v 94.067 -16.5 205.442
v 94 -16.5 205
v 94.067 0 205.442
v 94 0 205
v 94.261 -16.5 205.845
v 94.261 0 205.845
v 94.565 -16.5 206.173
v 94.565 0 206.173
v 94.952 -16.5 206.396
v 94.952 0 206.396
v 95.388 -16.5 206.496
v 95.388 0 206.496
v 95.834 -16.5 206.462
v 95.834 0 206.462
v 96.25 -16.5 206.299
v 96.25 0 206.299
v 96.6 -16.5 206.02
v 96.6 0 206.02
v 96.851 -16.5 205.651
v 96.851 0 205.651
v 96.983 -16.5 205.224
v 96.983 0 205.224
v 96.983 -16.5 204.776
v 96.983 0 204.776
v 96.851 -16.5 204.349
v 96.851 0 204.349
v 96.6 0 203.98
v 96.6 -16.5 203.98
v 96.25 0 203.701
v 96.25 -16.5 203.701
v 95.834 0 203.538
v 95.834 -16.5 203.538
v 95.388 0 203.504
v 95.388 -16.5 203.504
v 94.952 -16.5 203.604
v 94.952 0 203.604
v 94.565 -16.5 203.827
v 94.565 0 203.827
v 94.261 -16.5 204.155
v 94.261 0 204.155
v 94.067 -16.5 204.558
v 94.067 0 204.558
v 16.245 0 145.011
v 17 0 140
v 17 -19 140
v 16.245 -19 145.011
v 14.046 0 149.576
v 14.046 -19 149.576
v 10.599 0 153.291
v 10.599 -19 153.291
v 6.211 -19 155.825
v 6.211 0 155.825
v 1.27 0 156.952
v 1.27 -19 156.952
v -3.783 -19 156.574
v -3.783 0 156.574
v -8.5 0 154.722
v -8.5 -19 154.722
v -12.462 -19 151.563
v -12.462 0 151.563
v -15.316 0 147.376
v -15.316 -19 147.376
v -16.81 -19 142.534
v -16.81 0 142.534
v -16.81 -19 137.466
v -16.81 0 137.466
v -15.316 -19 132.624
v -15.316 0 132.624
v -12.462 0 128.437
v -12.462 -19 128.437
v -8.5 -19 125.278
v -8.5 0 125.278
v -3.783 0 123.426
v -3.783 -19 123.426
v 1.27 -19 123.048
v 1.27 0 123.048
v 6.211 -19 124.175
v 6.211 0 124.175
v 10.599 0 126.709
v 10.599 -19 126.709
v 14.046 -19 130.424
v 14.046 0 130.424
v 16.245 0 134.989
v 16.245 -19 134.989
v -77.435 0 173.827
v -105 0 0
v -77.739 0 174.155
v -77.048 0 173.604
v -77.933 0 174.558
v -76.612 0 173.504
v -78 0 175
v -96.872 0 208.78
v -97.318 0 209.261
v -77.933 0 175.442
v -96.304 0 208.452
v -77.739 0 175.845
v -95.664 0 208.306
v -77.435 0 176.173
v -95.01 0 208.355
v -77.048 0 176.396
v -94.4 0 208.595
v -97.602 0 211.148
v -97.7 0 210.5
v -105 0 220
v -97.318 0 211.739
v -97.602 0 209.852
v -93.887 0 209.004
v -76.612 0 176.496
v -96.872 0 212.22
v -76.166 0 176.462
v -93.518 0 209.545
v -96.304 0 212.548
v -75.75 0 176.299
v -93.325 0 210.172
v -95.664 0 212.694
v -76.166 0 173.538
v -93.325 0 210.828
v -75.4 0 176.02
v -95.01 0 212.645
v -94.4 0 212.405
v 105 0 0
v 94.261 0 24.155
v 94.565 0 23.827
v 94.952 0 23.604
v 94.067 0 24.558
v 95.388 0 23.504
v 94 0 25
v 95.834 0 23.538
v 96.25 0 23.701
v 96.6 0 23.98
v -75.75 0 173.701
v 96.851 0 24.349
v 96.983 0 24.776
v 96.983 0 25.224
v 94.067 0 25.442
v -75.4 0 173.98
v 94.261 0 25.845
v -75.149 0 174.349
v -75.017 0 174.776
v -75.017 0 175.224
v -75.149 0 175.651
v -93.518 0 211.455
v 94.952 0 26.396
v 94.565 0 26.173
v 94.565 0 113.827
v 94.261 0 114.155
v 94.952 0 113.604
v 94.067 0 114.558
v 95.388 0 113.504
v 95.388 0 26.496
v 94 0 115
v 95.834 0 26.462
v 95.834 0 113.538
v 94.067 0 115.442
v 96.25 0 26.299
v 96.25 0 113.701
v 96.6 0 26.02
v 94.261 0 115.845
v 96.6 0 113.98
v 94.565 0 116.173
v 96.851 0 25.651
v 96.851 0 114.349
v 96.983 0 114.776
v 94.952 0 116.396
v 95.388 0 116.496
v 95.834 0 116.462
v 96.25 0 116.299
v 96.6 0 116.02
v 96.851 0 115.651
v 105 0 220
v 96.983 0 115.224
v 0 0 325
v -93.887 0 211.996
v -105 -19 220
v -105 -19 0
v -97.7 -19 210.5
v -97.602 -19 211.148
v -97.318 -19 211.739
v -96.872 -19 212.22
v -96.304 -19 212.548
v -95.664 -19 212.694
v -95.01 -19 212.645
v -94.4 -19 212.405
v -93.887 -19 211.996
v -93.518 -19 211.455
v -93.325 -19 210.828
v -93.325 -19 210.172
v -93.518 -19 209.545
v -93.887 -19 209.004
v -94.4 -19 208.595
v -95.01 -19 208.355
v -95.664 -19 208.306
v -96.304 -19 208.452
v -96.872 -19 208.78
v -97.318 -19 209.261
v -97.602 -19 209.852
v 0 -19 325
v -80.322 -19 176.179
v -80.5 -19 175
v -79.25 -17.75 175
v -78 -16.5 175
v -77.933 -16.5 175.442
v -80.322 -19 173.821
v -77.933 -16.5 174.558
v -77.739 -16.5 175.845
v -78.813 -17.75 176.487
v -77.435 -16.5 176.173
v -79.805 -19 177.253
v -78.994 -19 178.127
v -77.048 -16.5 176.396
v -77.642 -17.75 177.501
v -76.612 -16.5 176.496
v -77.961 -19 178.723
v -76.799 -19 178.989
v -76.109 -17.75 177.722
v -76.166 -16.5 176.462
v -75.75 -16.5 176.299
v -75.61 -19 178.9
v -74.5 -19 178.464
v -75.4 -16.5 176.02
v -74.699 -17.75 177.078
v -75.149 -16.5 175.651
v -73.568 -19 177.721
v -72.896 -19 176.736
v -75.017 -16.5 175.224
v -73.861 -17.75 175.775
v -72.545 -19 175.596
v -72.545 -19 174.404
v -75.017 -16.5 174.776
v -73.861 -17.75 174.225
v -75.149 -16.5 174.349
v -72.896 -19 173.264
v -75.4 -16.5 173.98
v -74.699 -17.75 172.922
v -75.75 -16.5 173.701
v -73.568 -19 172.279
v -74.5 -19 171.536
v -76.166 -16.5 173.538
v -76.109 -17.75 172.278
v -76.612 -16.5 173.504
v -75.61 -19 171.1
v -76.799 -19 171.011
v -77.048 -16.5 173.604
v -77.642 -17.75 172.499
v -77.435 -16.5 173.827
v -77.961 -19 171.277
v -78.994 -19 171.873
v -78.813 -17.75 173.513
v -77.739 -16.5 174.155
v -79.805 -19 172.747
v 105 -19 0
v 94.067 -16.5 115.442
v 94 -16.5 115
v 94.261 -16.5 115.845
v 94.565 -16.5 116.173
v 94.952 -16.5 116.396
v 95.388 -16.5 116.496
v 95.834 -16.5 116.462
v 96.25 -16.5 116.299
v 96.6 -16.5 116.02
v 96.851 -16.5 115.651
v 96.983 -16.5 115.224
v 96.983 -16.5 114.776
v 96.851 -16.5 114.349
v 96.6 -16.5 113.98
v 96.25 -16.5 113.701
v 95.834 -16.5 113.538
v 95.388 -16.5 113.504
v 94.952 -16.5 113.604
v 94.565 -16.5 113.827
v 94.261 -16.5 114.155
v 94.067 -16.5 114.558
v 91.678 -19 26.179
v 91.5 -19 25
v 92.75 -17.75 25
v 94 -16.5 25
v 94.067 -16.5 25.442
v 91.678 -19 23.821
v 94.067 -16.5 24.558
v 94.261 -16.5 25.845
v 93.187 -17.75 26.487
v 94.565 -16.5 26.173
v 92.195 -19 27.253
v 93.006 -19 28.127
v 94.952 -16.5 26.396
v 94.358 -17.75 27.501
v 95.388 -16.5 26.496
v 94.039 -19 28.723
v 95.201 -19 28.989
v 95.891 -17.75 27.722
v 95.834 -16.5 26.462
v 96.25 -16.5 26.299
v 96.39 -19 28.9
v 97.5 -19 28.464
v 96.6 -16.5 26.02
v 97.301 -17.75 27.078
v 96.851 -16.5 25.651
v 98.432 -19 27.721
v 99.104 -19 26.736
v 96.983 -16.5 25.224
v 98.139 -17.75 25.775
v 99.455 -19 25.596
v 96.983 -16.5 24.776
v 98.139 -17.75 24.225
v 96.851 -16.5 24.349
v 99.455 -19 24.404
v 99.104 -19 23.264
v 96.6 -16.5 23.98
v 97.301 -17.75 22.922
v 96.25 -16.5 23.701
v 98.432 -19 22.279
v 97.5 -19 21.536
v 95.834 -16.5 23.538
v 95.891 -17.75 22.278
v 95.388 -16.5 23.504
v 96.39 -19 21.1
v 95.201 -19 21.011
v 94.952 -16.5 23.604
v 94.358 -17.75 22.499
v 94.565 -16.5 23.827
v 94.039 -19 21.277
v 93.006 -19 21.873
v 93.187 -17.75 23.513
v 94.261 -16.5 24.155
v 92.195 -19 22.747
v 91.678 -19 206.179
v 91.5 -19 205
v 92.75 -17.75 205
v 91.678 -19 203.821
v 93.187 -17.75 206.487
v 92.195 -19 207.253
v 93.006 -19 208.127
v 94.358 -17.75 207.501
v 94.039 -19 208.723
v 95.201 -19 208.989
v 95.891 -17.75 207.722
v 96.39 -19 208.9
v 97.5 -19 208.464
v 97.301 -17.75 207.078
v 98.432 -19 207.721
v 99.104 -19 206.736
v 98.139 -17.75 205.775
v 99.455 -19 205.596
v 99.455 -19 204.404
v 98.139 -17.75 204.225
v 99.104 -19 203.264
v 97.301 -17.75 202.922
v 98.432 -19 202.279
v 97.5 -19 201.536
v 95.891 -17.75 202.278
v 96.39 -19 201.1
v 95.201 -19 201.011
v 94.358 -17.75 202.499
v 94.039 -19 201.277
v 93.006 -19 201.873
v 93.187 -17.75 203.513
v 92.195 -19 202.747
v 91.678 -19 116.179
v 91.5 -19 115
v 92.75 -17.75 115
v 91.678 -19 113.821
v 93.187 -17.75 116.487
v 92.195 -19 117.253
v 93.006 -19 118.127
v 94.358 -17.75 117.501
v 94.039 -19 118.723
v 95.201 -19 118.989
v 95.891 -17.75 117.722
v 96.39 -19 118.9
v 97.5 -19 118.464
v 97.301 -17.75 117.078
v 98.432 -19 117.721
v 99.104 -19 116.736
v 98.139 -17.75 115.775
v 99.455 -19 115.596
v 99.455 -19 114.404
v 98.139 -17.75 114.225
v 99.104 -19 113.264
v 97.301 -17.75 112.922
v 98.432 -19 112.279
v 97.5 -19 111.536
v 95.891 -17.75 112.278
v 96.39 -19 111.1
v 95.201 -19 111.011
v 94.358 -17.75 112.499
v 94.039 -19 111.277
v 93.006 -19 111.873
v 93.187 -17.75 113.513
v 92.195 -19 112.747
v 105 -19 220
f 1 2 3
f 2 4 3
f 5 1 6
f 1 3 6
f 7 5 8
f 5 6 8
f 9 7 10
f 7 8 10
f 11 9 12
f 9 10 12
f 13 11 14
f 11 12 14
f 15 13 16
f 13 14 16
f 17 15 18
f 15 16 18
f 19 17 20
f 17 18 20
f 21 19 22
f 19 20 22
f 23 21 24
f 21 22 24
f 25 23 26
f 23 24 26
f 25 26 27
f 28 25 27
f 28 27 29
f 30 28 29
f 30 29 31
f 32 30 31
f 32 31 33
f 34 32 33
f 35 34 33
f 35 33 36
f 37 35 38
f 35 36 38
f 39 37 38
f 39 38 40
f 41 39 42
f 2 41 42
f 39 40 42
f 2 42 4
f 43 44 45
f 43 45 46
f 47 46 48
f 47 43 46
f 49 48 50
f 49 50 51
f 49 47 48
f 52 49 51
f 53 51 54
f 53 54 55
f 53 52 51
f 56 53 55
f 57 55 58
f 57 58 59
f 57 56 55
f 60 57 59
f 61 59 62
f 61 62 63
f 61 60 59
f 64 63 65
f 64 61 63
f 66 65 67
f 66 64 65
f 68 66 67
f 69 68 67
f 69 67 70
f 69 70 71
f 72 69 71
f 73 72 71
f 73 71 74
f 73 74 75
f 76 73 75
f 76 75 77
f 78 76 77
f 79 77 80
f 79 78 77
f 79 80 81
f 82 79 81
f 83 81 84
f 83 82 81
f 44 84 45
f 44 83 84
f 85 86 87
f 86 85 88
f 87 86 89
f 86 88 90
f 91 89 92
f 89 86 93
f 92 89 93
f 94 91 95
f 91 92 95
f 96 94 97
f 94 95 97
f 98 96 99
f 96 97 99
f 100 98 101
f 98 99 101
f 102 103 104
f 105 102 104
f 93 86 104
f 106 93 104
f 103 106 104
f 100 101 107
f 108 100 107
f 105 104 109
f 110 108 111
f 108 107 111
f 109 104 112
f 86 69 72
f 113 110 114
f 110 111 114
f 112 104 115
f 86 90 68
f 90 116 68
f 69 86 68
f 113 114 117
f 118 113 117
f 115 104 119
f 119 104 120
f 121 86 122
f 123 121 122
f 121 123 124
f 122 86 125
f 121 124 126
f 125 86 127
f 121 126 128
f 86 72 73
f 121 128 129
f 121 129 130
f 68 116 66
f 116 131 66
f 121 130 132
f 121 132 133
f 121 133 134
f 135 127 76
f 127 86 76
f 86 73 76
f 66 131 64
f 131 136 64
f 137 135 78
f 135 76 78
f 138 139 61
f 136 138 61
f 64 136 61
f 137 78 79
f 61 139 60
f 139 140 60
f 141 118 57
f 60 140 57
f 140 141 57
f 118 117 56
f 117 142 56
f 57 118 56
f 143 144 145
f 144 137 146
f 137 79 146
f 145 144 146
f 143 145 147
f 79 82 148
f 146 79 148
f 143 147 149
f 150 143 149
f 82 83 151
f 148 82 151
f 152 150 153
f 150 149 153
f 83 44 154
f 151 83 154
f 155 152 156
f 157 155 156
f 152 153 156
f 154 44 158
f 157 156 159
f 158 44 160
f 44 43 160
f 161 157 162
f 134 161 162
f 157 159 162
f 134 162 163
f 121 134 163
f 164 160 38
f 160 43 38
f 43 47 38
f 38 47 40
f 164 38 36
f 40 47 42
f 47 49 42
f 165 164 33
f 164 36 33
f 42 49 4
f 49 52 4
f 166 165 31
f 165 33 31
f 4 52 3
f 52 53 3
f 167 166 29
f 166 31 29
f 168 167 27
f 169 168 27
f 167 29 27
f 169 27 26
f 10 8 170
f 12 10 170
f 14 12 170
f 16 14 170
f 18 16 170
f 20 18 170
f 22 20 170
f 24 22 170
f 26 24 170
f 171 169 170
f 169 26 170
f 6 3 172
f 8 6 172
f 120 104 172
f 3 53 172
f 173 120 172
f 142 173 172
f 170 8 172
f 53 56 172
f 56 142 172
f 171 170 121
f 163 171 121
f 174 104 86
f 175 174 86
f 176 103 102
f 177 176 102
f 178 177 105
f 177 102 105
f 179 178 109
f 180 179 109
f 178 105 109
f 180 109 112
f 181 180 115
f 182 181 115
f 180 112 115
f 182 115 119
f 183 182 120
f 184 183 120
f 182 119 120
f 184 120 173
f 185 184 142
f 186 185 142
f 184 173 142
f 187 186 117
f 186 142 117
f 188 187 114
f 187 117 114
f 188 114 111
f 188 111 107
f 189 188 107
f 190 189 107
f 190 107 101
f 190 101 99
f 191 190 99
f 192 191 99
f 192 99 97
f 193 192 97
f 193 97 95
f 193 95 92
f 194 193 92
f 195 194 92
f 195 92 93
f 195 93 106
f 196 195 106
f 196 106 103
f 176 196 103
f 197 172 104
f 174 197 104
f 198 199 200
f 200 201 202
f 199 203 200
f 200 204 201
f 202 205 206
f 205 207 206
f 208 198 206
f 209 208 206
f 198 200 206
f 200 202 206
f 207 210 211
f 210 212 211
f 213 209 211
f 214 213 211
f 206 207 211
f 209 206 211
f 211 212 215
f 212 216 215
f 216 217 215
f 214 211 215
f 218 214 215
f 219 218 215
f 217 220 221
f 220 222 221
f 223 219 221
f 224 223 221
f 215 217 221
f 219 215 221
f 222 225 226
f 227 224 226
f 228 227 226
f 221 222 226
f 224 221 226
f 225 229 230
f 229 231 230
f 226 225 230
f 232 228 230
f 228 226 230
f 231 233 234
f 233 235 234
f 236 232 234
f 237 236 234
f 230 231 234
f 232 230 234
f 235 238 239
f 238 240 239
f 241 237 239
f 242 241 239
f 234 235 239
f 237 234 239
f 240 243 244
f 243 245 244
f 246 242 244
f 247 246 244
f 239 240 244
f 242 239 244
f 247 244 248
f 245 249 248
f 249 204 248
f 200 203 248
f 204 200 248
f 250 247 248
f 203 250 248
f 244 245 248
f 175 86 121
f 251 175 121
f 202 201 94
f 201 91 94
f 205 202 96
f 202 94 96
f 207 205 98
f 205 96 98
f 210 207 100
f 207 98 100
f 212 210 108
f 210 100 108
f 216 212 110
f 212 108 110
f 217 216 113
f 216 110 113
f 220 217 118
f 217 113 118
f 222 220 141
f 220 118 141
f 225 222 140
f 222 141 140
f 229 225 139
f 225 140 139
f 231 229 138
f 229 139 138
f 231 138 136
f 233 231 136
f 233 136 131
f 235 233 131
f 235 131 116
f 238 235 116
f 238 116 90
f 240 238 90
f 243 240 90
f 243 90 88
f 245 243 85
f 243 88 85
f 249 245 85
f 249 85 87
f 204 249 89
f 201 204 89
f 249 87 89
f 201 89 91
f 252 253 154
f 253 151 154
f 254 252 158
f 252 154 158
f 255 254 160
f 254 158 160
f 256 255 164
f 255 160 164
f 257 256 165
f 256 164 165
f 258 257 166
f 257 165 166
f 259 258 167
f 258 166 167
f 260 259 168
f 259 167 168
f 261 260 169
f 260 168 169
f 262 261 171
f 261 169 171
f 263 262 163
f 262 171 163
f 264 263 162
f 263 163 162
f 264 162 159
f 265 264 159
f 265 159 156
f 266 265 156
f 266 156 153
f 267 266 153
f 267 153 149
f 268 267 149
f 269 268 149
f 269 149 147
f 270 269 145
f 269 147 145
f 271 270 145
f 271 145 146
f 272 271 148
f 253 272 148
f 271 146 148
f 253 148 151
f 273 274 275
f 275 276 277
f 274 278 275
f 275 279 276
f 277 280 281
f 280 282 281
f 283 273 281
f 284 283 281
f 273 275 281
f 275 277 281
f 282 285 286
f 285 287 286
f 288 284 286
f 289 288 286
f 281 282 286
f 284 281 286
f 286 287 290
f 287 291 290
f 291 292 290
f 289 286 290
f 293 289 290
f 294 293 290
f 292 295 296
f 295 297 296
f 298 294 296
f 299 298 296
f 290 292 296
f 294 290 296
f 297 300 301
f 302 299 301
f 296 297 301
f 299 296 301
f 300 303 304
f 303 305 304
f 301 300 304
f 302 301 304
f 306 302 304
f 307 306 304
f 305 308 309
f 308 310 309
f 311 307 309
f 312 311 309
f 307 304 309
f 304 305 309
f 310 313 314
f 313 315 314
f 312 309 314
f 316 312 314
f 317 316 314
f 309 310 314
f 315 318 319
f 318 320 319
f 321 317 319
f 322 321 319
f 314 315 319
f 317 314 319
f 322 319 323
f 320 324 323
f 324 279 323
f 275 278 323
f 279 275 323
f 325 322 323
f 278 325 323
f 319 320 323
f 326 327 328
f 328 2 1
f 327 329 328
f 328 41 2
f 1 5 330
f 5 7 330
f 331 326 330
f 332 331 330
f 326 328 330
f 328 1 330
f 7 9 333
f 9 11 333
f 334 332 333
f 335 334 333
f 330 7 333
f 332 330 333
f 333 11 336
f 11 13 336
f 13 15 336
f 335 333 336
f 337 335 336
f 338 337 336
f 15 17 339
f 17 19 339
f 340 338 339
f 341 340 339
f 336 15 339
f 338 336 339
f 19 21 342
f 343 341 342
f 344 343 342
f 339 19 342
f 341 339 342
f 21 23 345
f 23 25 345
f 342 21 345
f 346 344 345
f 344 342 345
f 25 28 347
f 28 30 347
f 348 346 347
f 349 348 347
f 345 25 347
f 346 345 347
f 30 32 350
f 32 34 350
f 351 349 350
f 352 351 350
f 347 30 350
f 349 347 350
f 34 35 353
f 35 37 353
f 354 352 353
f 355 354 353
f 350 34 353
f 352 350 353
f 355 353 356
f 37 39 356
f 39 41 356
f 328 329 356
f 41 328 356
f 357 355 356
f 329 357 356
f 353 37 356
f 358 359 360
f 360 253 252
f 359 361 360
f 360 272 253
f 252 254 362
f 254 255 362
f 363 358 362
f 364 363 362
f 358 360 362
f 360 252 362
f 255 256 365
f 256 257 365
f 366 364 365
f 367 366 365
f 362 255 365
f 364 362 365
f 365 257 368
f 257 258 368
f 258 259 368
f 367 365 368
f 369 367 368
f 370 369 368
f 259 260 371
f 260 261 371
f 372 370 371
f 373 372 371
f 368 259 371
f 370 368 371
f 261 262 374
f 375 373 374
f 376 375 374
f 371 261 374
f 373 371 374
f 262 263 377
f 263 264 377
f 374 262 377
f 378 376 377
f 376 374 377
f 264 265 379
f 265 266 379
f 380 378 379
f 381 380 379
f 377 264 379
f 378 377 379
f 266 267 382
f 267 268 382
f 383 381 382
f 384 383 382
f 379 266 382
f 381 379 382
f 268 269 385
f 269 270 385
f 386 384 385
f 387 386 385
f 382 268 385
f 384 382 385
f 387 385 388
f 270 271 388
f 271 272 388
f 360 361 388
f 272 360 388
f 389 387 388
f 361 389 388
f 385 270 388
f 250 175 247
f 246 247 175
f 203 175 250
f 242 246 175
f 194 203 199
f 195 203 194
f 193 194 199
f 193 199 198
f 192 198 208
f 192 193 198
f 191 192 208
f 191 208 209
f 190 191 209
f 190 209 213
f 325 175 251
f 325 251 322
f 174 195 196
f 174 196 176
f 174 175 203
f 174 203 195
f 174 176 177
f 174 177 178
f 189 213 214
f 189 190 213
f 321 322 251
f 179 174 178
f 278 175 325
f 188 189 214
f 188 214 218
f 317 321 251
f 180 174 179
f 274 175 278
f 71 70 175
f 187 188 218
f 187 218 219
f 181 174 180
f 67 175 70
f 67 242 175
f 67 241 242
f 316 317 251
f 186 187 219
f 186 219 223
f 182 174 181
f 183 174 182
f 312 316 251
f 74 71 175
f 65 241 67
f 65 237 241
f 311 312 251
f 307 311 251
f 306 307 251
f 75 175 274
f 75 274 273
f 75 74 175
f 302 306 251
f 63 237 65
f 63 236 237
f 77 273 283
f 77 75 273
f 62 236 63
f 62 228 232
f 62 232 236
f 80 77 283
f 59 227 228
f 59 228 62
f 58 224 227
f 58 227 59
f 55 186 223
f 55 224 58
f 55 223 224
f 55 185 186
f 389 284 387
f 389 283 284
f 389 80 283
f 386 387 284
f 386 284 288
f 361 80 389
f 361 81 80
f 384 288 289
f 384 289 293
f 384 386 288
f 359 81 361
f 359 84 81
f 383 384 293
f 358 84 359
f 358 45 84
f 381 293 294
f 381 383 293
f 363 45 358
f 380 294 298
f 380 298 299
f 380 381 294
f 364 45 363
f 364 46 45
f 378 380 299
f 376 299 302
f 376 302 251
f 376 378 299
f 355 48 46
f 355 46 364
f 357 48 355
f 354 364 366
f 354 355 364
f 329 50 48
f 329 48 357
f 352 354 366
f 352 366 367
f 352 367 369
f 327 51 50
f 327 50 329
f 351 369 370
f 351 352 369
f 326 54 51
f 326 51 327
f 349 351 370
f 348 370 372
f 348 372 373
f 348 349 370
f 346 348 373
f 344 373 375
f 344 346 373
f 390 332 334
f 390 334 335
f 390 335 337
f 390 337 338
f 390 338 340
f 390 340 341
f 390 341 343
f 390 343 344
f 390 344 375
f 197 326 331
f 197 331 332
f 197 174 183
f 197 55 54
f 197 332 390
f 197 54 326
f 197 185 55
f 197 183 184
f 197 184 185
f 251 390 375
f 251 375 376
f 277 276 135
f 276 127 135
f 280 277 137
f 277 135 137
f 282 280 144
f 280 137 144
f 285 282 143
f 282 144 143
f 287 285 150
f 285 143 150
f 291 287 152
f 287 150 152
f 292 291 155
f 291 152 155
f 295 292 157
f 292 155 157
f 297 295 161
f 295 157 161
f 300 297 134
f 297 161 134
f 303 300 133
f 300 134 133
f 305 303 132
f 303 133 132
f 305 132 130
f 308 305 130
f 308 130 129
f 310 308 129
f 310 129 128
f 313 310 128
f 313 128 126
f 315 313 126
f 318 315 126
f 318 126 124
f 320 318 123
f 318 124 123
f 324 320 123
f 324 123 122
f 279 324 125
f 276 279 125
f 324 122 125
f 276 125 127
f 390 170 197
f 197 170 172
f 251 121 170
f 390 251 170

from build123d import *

# Parameters (mm, degrees)
F1_R           = 17
F2_DEPTH       = 19
F4_D           = 3
F4_CSINK_D     = 8
F4_CSINK_ANGLE = 90
F5_D           = 4.4


with BuildPart() as f2:
    # F1 (on Front) → F2 (new body)
    with BuildSketch(Plane.XZ):
        Polygon((105, 0), (105, 220), (0, 325), (-105, 220), (-105, 0), align=None)
        with Locations((0, 140)):
            Circle(F1_R, mode=Mode.SUBTRACT)
    extrude(amount=F2_DEPTH)

    # F4 (through all)
    with Locations(Plane.XZ.offset(19)):
        with Locations((95.5, 25), (95.5, 115), (95.5, 205), (-76.5, 175)):
            CounterSinkHole(F4_D / 2, F4_CSINK_D / 2, counter_sink_angle=F4_CSINK_ANGLE)

    # F5 (through all)
    with Locations(Plane.XZ.offset(19)):
        with Locations((-95.5, 210.5)):
            Hole(F5_D / 2)


solid = f2.part
